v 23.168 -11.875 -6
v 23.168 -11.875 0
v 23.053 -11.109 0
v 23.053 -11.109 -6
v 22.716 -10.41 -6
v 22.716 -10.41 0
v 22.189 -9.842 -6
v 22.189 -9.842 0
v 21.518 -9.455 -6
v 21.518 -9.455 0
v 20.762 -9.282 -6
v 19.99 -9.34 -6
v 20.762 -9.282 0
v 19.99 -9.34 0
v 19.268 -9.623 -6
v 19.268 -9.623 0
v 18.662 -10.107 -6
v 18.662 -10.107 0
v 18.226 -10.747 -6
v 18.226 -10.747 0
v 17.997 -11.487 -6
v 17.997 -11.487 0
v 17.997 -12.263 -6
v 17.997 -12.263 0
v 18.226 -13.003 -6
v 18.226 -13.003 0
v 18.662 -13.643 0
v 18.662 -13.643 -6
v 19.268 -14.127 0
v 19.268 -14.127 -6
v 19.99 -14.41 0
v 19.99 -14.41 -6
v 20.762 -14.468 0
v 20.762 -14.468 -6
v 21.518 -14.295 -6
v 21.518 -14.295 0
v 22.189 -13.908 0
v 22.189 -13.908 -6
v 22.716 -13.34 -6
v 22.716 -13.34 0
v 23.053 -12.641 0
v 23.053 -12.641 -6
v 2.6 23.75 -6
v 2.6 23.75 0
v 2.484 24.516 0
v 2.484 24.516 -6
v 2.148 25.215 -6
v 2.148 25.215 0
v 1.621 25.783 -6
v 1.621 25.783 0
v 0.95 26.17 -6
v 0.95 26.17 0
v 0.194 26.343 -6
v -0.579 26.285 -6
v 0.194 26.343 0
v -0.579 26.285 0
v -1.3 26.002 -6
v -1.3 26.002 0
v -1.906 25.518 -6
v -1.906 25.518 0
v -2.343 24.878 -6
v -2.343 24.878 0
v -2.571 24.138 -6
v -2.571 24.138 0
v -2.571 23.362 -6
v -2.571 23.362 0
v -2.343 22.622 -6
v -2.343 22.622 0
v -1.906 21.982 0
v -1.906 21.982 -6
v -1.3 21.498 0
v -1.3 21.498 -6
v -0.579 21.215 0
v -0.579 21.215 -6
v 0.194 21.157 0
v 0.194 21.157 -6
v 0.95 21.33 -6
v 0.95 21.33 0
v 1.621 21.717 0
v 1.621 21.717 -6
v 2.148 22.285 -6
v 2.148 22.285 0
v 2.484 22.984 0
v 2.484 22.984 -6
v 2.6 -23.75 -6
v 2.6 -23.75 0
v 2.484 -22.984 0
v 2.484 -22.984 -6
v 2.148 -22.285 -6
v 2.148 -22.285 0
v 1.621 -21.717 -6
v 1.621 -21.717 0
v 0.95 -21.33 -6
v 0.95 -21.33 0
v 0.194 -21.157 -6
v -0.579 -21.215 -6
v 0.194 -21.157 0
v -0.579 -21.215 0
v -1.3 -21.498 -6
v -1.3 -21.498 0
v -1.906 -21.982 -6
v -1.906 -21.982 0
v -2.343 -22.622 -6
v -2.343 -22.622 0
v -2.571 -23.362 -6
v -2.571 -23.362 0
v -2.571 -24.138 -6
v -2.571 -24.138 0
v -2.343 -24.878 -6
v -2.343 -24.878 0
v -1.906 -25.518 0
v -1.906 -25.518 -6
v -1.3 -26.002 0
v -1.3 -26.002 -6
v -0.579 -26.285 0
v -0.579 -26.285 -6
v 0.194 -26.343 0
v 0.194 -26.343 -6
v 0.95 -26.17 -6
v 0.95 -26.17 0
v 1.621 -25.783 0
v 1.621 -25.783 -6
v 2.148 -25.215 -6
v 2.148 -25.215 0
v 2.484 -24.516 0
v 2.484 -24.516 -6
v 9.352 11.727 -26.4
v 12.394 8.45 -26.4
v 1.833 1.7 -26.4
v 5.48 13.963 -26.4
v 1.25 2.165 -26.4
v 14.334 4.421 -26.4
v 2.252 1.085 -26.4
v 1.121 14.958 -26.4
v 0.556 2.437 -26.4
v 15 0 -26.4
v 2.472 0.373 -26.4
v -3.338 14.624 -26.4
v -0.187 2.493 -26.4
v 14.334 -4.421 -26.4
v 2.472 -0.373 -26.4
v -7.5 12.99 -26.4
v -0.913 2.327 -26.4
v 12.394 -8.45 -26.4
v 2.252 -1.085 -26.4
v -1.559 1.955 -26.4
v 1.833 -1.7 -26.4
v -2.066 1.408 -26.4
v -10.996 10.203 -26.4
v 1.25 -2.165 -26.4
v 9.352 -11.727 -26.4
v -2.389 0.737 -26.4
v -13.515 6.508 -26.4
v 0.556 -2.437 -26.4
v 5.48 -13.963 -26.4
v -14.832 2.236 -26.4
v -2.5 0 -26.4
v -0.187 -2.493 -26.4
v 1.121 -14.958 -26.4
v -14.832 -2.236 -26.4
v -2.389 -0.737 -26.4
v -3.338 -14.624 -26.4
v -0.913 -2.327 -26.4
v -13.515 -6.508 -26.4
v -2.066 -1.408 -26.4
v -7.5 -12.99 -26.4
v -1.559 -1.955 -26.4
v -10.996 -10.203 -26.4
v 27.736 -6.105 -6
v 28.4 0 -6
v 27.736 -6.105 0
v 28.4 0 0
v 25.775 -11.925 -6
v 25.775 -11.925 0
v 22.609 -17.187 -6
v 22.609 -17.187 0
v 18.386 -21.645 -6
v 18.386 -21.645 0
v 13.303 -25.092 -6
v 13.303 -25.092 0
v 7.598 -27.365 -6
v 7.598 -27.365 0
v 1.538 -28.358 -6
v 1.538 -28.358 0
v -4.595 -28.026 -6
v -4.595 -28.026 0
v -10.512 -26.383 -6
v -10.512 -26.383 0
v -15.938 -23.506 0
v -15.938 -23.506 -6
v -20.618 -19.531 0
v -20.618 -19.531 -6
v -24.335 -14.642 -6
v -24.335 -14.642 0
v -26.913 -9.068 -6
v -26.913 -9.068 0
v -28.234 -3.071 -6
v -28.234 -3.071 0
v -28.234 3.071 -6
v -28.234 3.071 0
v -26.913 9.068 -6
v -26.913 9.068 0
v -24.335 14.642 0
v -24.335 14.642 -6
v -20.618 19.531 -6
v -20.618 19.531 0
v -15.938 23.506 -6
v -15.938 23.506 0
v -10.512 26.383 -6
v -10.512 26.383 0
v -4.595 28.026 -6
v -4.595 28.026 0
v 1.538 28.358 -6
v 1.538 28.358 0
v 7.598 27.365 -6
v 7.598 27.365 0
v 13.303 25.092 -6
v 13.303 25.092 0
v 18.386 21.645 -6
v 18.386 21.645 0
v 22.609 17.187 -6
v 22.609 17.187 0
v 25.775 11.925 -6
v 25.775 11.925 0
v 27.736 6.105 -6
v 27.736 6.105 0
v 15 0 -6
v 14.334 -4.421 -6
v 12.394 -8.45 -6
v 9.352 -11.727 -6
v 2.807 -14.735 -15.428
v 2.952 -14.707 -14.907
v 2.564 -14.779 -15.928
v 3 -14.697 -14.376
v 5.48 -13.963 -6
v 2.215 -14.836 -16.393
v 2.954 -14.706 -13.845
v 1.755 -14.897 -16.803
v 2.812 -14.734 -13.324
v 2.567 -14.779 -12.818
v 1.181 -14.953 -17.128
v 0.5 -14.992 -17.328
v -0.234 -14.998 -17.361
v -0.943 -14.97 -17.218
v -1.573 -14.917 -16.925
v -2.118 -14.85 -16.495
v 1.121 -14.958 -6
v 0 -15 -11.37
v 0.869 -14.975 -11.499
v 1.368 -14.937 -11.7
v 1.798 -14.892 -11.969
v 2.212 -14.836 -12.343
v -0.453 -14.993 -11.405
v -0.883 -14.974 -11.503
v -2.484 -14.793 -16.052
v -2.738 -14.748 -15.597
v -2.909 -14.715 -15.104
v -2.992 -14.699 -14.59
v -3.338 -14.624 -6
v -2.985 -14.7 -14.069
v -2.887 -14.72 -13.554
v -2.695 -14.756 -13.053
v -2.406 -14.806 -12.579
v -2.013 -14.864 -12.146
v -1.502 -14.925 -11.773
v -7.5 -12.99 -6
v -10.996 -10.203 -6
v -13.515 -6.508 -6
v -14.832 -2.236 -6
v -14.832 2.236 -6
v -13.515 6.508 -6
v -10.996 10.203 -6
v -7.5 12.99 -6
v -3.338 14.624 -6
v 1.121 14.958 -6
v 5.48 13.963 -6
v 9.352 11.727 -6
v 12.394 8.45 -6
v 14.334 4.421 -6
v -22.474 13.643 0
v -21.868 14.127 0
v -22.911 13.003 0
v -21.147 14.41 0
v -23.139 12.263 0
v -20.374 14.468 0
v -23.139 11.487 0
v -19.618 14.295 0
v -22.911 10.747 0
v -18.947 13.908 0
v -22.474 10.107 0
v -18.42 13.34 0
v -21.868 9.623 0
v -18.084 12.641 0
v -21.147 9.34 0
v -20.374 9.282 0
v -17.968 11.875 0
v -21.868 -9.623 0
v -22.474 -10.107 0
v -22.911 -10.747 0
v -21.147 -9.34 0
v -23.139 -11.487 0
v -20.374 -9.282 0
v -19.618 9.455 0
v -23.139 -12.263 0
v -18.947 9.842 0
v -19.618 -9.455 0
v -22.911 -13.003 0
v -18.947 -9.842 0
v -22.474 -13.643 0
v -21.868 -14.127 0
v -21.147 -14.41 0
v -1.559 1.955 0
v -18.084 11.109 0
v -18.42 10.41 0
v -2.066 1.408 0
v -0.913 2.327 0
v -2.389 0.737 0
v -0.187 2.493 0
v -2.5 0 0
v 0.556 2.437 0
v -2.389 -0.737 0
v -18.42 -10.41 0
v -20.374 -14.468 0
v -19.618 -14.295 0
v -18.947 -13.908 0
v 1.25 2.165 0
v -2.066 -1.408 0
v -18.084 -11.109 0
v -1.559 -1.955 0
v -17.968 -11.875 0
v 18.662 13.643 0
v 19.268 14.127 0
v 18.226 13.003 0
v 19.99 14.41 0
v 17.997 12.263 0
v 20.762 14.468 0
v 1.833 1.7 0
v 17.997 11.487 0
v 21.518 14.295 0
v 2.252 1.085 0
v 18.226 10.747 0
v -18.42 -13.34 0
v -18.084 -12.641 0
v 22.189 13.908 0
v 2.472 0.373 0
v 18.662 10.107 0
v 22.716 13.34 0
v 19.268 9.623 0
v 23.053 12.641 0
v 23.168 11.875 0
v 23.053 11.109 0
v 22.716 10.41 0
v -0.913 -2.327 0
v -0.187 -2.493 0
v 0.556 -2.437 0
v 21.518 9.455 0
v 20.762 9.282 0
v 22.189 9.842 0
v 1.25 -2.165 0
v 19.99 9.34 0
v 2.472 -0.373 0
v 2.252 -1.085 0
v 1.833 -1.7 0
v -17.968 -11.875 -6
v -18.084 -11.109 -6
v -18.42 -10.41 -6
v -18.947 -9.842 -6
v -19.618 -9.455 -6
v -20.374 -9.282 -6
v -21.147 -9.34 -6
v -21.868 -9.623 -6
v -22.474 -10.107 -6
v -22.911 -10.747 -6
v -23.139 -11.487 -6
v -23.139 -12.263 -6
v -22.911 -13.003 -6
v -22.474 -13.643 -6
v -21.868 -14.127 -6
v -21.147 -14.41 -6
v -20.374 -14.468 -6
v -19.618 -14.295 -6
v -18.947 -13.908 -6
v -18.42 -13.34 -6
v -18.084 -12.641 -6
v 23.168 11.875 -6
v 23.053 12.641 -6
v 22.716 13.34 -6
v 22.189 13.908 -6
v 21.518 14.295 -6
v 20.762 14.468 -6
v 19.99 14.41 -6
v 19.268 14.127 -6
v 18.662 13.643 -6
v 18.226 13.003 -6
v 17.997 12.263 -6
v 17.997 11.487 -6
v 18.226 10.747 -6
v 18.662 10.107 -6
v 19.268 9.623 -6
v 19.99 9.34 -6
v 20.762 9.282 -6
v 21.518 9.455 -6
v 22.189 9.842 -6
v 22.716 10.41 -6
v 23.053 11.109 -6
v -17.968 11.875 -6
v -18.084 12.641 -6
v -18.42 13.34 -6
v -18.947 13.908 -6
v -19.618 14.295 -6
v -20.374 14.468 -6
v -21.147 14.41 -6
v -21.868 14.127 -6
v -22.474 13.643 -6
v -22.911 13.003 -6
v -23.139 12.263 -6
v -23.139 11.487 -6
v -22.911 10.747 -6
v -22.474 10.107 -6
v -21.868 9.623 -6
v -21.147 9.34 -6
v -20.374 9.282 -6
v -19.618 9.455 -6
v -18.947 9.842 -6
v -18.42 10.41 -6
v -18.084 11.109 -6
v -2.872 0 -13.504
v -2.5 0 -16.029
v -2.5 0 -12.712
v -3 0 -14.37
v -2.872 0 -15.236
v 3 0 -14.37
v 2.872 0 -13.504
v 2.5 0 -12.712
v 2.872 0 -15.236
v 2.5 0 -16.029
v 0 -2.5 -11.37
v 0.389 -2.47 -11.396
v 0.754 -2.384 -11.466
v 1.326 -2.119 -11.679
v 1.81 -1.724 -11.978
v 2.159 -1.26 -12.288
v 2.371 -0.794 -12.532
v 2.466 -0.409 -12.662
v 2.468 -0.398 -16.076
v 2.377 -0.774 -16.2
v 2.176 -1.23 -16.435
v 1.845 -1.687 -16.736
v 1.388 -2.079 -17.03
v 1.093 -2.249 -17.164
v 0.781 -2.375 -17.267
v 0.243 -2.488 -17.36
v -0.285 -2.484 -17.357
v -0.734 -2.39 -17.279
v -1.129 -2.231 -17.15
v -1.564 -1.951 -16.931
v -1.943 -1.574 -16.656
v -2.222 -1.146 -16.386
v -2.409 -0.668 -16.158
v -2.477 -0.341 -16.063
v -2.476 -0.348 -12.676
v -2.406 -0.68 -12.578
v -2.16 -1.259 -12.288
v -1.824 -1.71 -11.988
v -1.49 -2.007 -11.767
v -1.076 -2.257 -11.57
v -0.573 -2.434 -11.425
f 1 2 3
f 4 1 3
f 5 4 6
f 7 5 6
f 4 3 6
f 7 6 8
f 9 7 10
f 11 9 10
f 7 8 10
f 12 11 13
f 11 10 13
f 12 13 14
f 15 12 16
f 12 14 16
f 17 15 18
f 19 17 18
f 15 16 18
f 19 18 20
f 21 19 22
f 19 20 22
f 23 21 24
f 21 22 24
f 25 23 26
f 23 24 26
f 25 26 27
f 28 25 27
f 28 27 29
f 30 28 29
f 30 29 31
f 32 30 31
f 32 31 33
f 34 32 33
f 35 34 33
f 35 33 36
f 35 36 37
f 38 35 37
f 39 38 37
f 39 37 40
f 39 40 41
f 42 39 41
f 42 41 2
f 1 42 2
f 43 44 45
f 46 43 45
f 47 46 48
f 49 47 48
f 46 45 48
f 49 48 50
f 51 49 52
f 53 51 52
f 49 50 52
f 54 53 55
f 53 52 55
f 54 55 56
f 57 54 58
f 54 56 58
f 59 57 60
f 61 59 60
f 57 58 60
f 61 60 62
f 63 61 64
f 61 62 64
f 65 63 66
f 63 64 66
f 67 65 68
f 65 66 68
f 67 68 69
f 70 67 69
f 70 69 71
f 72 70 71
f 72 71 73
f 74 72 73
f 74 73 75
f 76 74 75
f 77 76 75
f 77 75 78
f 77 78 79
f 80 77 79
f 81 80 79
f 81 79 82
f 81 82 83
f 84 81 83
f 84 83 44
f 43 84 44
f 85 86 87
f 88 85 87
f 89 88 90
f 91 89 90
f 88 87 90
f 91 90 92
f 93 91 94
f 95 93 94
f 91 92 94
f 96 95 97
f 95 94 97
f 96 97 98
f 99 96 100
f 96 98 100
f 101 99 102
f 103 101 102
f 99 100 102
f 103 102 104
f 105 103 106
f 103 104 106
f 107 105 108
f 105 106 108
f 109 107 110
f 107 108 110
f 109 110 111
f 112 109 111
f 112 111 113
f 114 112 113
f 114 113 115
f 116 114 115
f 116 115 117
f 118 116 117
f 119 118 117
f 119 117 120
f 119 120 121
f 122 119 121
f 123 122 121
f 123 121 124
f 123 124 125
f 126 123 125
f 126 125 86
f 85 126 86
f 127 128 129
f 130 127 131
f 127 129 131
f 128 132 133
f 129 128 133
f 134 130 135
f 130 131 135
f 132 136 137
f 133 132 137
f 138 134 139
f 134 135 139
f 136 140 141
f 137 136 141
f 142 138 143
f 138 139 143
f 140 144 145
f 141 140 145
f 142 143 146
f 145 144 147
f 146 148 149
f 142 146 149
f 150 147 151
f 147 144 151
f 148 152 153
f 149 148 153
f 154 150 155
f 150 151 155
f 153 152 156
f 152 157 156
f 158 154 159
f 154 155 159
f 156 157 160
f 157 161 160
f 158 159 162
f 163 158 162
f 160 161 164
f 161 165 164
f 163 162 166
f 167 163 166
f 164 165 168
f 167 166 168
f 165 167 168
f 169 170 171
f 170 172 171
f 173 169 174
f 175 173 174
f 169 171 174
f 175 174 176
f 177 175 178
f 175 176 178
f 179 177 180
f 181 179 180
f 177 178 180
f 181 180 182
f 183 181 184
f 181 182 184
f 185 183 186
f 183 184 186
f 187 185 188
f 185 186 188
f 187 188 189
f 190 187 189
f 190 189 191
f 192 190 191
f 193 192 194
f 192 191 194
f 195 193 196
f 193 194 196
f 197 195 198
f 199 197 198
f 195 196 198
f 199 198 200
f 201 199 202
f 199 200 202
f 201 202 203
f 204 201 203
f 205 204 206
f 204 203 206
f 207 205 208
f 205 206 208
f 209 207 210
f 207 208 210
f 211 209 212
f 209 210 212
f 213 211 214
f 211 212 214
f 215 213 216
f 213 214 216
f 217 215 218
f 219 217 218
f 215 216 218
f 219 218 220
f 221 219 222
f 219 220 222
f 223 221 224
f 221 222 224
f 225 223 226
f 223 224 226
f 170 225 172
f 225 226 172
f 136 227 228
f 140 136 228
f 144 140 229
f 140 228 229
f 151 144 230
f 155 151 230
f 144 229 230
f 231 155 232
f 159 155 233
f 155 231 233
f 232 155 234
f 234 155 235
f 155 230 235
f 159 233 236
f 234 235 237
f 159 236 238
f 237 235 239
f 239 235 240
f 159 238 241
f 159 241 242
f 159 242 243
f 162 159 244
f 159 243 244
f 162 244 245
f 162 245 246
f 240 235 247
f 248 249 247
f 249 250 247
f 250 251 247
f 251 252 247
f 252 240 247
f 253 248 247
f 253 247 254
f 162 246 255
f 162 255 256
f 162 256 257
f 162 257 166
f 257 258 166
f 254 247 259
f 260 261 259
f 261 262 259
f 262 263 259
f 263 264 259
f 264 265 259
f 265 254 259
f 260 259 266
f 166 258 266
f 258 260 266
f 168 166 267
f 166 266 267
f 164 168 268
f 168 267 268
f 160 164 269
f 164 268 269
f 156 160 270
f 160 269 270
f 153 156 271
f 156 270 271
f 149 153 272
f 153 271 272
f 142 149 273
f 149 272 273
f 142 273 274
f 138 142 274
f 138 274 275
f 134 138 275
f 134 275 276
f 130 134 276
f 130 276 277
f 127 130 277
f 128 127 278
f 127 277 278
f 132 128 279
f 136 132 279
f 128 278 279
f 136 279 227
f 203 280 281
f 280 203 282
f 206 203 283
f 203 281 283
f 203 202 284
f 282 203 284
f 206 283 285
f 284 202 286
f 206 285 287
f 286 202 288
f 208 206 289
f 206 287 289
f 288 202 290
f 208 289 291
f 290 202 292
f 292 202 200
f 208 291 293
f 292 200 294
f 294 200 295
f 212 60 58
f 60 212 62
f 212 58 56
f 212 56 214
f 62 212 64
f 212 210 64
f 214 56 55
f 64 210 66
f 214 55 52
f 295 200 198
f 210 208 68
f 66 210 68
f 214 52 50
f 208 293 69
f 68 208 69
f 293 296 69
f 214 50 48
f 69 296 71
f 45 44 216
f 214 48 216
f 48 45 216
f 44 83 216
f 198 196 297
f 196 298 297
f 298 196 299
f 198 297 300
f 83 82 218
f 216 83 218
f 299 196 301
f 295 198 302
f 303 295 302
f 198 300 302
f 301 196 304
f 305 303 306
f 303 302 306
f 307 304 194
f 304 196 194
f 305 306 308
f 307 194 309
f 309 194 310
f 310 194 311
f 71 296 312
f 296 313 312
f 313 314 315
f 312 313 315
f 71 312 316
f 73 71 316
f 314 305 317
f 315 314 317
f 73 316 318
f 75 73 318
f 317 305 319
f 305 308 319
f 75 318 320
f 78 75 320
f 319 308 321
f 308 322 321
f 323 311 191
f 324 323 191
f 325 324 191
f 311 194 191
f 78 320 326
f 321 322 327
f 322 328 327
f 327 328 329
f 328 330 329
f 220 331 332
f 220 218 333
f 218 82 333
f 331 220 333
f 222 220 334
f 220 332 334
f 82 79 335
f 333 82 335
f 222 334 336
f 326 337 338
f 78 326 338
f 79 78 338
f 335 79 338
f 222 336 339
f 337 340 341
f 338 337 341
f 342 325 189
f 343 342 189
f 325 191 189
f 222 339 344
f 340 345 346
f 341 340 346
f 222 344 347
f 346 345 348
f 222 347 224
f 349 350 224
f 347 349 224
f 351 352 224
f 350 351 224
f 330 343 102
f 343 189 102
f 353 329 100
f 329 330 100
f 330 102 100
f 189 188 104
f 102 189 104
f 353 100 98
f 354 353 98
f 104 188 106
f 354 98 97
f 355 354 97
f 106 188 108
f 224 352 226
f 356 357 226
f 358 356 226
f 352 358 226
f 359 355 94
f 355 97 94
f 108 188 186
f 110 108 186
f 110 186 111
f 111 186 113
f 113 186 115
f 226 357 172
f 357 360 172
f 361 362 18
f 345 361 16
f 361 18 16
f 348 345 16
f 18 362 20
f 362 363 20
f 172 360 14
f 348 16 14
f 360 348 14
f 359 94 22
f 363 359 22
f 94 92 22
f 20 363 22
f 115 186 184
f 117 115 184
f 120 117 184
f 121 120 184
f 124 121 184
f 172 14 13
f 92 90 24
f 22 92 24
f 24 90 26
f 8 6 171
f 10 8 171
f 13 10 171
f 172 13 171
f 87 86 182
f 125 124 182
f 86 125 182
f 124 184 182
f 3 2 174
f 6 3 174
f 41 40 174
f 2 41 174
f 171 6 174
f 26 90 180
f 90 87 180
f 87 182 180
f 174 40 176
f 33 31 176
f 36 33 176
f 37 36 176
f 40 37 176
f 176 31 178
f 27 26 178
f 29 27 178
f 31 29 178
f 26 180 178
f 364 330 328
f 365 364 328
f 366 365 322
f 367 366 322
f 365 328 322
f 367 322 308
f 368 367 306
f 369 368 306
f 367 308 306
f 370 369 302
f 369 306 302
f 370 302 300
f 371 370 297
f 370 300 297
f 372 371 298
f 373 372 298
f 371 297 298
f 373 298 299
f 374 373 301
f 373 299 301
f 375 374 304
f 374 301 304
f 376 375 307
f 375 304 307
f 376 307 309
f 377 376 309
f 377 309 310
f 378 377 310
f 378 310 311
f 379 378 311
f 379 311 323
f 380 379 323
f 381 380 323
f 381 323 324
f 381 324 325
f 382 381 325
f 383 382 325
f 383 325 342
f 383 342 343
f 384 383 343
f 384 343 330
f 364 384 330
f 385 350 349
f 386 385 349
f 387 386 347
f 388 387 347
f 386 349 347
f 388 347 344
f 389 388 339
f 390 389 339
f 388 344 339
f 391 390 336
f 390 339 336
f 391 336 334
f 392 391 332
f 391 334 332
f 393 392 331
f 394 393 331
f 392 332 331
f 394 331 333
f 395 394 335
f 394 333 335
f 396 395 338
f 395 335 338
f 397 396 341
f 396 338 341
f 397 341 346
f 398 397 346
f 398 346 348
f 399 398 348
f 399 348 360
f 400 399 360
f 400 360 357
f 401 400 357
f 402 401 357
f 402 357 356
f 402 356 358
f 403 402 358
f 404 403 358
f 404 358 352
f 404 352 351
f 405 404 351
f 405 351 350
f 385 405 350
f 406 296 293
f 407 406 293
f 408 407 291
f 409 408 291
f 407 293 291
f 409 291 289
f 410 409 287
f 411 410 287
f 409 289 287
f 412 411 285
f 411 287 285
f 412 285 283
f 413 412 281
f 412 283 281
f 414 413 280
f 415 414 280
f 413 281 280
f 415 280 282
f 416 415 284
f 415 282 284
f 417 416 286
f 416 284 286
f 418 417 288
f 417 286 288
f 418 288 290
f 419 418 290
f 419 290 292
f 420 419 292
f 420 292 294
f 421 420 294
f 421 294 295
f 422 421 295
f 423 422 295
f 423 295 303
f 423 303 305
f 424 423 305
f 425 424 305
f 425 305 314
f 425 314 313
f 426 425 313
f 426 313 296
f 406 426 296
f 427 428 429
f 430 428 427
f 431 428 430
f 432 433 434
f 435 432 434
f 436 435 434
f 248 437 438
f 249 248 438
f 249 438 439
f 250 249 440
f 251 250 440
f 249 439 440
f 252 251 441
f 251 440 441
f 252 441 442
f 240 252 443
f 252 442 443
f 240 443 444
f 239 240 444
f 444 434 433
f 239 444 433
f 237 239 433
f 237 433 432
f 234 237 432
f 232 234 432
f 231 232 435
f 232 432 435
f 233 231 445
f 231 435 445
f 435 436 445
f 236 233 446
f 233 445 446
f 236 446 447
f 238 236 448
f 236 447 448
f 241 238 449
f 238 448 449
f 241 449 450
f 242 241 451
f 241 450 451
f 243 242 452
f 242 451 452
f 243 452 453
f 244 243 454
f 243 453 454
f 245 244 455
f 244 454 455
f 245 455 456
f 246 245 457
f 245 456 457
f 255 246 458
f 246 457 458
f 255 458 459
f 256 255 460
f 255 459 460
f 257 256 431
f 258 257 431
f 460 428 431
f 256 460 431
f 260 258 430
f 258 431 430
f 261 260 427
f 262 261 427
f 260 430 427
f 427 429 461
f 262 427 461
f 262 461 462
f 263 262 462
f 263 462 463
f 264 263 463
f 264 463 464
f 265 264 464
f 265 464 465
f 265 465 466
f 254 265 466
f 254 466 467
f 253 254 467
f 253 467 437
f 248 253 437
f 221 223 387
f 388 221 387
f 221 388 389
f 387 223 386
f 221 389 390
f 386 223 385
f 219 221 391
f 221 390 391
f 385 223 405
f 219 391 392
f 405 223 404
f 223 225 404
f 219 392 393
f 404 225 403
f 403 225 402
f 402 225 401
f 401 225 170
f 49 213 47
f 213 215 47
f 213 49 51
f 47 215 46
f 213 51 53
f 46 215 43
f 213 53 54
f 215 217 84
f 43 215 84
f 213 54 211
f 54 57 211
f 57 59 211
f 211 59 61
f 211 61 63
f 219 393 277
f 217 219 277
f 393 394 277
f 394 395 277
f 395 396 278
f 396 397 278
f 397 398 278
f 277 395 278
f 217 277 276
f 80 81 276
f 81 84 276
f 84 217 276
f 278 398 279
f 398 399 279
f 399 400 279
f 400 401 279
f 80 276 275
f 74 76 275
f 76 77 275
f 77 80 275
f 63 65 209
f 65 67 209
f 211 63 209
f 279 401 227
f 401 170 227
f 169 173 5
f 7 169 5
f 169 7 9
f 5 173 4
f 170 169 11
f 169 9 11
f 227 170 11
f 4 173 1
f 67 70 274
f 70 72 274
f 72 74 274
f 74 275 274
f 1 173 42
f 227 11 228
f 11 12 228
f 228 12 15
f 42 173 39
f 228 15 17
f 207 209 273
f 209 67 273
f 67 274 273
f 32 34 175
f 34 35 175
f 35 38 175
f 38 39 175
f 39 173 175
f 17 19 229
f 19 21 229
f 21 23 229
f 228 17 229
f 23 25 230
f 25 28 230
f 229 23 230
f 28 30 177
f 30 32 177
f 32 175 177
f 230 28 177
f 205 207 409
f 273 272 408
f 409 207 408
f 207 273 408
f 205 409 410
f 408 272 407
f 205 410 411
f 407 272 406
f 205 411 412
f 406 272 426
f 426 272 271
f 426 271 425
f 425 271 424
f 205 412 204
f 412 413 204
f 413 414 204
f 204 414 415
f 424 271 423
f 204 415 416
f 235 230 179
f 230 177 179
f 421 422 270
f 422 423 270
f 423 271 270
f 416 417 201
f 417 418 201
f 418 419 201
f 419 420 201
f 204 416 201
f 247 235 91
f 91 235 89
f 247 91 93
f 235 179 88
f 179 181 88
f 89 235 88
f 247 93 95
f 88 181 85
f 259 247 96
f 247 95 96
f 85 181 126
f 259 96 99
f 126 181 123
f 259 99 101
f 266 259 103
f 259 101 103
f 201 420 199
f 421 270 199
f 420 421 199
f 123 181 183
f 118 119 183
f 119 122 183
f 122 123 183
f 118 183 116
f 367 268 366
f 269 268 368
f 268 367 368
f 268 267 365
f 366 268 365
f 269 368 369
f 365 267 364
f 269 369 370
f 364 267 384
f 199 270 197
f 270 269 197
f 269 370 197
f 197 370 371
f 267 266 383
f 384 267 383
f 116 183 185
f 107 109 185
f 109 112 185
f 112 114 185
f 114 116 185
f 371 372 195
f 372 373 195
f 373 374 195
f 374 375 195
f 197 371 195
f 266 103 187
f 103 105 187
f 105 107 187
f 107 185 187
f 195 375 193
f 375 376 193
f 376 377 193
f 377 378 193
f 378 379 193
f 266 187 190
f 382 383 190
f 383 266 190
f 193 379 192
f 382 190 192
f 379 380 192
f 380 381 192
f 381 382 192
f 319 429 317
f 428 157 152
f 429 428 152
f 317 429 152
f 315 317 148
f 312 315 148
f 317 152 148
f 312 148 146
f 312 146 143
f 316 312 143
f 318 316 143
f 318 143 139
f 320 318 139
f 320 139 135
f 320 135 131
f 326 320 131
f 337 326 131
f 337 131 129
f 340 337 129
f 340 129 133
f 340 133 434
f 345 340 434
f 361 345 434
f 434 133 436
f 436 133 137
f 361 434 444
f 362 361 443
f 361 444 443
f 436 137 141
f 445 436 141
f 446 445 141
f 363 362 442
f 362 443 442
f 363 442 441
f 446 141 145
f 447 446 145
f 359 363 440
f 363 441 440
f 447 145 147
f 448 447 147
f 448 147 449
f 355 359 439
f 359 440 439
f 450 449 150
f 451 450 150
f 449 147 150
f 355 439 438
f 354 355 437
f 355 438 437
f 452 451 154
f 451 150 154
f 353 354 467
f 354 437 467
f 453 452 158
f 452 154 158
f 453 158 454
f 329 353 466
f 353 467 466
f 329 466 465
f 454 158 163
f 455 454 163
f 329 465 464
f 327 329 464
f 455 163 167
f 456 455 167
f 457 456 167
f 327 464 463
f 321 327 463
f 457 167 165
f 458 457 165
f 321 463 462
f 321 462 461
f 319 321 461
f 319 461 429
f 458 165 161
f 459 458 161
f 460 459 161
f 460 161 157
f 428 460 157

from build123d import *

# Parameters (mm, degrees)
SKETCH_2_R          = 2.5
CUT_EXTRUDE_1_DEPTH = 49.063291606
SKETCH_3_R          = 3
CUT_EXTRUDE_2_DEPTH = 49.063291606
SKETCH_4_R          = 2.6
CUT_EXTRUDE_3_DEPTH = 49.063291661


with BuildPart() as part:
    # 草图1 → 旋转1 (revolve)
    with BuildSketch(Plane(origin=(0, 0, 0), x_dir=(1, 0, 0), z_dir=(0, 1, 0))):
        Polygon((0, 0), (0, 26.4), (15, 26.4), (15, 6), (28.4, 6), (28.4, 0), align=None)
    revolve(axis=Axis((0, 0, 0), (0, 0, -1)))

    # 草图2 → 切除-拉伸1 (cut, through all)
    with BuildSketch(Plane(origin=(0, 0, -26.4), x_dir=(-1, 0, 0), z_dir=(0, 0, -1))):
        Circle(SKETCH_2_R)
    extrude(amount=-CUT_EXTRUDE_1_DEPTH, mode=Mode.SUBTRACT)

    # 草图3 → 切除-拉伸2 (cut, through all)
    with BuildSketch(Plane(origin=(0, 0, 0), x_dir=(1, 0, 0), z_dir=(0, 1, 0))):
        with Locations(Location((0, 14.370233869, 0), (0, 0, 270))):
            Circle(SKETCH_3_R)
    extrude(amount=-CUT_EXTRUDE_2_DEPTH, mode=Mode.SUBTRACT)

    # 草图4 → 切除-拉伸3 (cut, through all)
    with BuildSketch(Plane.XY):
        with Locations((0, 23.75)):
            Circle(SKETCH_4_R)
        with Locations((20.56810334, 11.875)):
            Circle(SKETCH_4_R)
        with Locations((20.56810334, -11.875)):
            Circle(SKETCH_4_R)
        with Locations((0, -23.75)):
            Circle(SKETCH_4_R)
        with Locations((-20.56810334, -11.875)):
            Circle(SKETCH_4_R)
        with Locations((-20.56810334, 11.875)):
            Circle(SKETCH_4_R)
    extrude(amount=-CUT_EXTRUDE_3_DEPTH, mode=Mode.SUBTRACT)


solid = part.part
